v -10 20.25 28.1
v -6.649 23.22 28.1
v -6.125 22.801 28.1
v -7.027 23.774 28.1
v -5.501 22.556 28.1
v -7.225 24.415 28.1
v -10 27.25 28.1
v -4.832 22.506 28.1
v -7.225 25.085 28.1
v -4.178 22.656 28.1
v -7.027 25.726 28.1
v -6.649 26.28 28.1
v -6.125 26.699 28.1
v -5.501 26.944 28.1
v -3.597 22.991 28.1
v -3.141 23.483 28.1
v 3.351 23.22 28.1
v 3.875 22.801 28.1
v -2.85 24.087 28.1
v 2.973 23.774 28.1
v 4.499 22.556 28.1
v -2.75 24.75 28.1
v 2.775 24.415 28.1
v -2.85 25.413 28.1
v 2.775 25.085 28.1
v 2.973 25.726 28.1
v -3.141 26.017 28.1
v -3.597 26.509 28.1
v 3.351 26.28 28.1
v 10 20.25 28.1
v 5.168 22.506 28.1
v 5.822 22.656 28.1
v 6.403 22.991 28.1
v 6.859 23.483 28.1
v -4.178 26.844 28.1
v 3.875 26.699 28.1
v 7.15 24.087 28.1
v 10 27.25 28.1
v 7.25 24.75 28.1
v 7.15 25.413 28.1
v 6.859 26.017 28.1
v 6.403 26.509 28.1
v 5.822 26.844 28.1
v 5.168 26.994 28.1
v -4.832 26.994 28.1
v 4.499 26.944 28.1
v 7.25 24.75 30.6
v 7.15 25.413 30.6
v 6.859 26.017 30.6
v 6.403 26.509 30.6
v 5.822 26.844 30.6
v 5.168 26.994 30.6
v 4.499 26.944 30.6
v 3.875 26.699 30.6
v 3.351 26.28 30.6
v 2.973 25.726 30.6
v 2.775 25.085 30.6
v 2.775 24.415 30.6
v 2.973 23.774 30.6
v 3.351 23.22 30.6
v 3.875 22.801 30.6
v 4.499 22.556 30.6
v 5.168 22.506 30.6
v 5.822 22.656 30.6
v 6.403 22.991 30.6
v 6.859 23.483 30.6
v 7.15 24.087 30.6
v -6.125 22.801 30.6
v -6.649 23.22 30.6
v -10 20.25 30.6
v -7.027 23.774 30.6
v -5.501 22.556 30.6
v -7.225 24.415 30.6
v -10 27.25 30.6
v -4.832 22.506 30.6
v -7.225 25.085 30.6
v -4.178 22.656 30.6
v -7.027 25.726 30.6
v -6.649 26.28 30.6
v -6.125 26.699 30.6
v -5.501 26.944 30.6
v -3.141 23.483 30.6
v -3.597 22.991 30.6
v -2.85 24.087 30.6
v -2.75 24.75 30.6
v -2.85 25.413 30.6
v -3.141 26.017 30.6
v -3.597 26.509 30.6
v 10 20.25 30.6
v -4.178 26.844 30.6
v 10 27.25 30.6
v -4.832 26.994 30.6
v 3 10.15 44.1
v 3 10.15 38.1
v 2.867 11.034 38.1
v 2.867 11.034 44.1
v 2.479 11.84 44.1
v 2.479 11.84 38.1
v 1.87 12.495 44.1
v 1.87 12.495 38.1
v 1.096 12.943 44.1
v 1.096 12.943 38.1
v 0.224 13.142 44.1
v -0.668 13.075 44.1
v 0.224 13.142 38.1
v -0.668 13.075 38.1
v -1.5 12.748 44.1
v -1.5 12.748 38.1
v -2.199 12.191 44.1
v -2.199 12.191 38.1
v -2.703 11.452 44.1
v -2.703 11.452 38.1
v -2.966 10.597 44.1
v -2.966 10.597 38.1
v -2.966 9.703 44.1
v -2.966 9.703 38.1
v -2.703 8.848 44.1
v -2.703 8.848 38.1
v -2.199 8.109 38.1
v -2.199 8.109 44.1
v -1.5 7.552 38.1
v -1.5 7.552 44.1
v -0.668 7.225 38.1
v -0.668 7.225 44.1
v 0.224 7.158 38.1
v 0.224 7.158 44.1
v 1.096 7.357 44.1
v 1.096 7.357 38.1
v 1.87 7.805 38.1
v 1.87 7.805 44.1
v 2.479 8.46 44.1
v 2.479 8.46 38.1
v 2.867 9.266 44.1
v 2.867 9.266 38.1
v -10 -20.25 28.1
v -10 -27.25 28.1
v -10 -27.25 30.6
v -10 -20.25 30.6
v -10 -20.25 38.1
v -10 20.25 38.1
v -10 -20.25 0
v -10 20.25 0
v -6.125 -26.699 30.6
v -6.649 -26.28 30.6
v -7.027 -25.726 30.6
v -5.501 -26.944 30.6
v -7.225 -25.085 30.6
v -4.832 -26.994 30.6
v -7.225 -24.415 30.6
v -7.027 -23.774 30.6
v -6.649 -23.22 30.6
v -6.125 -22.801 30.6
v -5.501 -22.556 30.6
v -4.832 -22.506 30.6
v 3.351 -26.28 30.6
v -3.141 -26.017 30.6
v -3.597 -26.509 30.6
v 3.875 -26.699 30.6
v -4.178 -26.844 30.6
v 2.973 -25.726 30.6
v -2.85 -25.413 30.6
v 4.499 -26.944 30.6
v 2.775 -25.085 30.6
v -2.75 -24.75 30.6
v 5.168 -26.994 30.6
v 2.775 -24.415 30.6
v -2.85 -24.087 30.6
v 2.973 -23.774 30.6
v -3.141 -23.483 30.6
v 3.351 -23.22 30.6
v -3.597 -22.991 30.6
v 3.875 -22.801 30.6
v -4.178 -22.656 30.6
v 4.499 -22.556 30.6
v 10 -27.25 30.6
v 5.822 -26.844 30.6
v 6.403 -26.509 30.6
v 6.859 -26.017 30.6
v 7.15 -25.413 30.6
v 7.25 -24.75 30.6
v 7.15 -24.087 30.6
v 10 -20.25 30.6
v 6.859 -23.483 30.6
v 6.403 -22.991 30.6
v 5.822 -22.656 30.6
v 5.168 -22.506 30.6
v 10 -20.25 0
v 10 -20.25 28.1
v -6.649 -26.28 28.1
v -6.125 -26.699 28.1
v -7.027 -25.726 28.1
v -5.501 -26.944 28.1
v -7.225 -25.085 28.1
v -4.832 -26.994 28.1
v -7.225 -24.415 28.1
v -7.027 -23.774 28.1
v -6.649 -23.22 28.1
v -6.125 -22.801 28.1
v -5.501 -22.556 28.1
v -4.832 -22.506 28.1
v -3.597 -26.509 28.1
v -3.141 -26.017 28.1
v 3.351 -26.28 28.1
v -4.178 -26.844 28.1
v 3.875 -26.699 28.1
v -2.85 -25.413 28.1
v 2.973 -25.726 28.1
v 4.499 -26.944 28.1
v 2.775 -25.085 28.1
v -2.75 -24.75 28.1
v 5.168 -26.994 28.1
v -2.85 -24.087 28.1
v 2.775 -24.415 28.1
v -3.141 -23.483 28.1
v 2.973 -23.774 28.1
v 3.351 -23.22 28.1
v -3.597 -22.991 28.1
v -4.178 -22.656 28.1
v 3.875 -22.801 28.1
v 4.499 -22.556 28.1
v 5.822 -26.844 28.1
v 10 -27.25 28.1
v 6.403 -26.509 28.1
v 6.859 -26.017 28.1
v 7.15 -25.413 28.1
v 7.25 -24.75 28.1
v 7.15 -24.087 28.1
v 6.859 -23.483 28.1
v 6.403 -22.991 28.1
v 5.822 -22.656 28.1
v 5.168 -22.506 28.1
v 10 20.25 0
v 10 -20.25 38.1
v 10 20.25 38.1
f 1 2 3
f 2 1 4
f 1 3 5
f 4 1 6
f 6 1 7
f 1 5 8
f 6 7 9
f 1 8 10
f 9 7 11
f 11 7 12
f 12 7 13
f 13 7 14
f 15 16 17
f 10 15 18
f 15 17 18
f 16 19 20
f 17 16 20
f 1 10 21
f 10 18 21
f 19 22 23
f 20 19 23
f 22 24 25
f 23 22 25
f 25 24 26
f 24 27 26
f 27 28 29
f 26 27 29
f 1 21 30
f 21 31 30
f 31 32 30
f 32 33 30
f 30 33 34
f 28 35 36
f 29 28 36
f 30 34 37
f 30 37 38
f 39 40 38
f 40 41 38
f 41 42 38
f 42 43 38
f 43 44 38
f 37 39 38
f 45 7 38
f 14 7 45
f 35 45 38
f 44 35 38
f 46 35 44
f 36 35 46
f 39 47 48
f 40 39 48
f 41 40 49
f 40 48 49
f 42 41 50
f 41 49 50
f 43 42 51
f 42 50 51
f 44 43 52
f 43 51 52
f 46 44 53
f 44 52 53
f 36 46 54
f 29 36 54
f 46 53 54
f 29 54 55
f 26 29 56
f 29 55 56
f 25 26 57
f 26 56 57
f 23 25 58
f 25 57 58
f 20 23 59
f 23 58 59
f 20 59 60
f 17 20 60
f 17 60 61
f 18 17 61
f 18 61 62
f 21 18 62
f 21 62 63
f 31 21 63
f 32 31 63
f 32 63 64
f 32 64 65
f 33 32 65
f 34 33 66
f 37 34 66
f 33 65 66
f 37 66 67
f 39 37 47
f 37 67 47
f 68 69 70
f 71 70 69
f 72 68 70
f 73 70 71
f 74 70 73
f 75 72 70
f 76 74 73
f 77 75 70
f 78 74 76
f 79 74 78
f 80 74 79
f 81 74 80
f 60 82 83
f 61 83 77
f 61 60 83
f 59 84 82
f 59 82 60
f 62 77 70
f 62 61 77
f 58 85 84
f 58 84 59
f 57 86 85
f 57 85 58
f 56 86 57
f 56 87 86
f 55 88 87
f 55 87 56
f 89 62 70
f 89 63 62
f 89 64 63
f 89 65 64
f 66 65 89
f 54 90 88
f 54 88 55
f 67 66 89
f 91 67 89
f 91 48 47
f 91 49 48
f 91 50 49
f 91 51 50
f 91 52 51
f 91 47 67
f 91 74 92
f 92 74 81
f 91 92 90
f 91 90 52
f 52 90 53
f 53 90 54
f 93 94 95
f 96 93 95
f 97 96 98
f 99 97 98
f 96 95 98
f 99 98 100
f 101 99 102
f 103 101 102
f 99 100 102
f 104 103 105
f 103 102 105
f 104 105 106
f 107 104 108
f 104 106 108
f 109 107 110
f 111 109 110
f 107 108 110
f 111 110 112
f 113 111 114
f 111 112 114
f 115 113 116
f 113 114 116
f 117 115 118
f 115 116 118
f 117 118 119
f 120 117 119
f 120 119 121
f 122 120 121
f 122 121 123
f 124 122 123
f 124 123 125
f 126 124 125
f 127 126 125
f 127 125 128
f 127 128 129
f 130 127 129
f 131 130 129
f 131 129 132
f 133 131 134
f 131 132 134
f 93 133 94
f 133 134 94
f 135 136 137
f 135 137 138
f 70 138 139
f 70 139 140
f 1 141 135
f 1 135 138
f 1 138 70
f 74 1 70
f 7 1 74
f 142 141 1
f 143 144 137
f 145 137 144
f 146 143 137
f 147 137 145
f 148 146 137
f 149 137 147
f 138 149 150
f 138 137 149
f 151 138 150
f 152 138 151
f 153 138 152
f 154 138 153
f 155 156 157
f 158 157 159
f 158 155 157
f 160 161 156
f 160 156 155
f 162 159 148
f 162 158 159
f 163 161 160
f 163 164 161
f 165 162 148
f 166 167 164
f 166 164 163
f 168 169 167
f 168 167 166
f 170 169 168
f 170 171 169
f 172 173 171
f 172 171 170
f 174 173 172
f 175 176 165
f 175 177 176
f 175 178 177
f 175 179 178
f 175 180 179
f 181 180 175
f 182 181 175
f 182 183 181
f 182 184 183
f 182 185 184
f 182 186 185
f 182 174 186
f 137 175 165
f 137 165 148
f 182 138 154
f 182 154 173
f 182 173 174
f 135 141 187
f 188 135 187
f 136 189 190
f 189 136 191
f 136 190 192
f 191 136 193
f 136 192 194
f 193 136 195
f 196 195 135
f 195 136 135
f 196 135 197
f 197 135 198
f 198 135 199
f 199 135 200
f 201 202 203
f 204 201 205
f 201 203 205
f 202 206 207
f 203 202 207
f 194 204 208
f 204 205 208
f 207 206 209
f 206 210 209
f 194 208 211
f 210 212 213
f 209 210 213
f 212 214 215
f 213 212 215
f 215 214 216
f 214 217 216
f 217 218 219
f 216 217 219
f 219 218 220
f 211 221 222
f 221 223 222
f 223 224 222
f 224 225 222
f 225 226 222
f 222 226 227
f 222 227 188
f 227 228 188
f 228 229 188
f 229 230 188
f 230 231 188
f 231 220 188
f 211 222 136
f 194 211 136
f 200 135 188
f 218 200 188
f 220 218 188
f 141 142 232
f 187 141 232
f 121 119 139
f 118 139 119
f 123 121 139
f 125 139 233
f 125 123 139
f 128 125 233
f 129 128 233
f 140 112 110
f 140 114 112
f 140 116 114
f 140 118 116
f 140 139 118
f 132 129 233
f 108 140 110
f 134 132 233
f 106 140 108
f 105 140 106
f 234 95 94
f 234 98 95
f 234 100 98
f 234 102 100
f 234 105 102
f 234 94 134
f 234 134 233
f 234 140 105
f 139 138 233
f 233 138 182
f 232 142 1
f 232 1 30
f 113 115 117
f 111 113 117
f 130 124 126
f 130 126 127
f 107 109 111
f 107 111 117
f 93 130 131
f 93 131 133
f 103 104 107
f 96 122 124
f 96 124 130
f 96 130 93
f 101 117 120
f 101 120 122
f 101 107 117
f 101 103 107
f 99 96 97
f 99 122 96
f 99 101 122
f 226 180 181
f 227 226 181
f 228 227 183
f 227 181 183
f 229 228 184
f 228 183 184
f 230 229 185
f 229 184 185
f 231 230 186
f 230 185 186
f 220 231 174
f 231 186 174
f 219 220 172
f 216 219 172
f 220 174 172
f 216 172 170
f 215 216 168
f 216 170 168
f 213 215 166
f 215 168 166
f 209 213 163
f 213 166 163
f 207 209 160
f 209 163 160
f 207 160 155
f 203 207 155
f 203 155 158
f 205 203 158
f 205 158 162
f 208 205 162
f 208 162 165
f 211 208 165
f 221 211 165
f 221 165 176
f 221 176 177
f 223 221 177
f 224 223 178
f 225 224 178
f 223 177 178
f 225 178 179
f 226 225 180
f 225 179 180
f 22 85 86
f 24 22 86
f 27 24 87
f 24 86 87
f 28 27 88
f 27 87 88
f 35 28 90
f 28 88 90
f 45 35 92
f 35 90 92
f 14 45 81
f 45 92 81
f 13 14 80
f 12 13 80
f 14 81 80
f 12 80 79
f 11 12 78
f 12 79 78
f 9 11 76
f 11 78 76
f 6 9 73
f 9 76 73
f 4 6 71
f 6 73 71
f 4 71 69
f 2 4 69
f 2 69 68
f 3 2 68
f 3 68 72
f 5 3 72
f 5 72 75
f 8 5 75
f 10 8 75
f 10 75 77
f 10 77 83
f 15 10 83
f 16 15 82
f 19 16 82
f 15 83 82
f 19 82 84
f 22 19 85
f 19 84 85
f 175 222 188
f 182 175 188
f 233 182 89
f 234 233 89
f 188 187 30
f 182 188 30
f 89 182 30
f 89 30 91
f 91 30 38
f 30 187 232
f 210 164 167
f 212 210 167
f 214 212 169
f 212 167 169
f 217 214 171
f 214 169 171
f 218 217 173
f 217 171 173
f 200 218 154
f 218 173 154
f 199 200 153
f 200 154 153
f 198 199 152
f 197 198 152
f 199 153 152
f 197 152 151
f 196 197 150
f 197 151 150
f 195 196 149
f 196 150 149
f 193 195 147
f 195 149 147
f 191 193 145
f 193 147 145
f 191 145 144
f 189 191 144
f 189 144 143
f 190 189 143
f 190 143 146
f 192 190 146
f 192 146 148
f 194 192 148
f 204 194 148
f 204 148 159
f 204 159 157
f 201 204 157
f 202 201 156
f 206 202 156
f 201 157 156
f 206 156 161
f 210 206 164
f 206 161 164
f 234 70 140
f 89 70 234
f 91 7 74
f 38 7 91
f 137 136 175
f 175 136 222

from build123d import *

# Parameters (mm, degrees)
F0_W     = 20
F0_H     = 40.5
F1_DEPTH = 38.1
F3_START = 28.1
F2_W     = 20
F2_H     = 54.5
F3_DEPTH = 2.5
F4_R     = 2.25
F5_DEPTH = 2.5
F6_R     = 3
F7_DEPTH = 6


with BuildPart() as f1:
    # F0 (on Top) → F1 (new body)
    with BuildSketch(Plane.XY):
        Rectangle(F0_W, F0_H)
    extrude(amount=F1_DEPTH)

    # F2 (on Top) → F3 (join)
    with BuildSketch(Plane.XY.offset(F3_START)):
        Rectangle(F2_W, F2_H)
    extrude(amount=F3_DEPTH)

    # F4 (on face) → F5 (cut)
    with BuildSketch(Plane.XY.offset(30.6)):
        with Locations((-5, 24.75)):
            Circle(F4_R)
        with Locations((5, 24.75)):
            Circle(F4_R)
        with Locations((5, -24.75)):
            Circle(F4_R)
        with Locations((-5, -24.75)):
            Circle(F4_R)
    extrude(amount=-F5_DEPTH, mode=Mode.SUBTRACT)

    # F6 (on face) → F7 (join)
    with BuildSketch(Plane.XY.offset(38.1)):
        with Locations((0, 10.15)):
            Circle(F6_R)
    extrude(amount=F7_DEPTH)


solid = f1.part
